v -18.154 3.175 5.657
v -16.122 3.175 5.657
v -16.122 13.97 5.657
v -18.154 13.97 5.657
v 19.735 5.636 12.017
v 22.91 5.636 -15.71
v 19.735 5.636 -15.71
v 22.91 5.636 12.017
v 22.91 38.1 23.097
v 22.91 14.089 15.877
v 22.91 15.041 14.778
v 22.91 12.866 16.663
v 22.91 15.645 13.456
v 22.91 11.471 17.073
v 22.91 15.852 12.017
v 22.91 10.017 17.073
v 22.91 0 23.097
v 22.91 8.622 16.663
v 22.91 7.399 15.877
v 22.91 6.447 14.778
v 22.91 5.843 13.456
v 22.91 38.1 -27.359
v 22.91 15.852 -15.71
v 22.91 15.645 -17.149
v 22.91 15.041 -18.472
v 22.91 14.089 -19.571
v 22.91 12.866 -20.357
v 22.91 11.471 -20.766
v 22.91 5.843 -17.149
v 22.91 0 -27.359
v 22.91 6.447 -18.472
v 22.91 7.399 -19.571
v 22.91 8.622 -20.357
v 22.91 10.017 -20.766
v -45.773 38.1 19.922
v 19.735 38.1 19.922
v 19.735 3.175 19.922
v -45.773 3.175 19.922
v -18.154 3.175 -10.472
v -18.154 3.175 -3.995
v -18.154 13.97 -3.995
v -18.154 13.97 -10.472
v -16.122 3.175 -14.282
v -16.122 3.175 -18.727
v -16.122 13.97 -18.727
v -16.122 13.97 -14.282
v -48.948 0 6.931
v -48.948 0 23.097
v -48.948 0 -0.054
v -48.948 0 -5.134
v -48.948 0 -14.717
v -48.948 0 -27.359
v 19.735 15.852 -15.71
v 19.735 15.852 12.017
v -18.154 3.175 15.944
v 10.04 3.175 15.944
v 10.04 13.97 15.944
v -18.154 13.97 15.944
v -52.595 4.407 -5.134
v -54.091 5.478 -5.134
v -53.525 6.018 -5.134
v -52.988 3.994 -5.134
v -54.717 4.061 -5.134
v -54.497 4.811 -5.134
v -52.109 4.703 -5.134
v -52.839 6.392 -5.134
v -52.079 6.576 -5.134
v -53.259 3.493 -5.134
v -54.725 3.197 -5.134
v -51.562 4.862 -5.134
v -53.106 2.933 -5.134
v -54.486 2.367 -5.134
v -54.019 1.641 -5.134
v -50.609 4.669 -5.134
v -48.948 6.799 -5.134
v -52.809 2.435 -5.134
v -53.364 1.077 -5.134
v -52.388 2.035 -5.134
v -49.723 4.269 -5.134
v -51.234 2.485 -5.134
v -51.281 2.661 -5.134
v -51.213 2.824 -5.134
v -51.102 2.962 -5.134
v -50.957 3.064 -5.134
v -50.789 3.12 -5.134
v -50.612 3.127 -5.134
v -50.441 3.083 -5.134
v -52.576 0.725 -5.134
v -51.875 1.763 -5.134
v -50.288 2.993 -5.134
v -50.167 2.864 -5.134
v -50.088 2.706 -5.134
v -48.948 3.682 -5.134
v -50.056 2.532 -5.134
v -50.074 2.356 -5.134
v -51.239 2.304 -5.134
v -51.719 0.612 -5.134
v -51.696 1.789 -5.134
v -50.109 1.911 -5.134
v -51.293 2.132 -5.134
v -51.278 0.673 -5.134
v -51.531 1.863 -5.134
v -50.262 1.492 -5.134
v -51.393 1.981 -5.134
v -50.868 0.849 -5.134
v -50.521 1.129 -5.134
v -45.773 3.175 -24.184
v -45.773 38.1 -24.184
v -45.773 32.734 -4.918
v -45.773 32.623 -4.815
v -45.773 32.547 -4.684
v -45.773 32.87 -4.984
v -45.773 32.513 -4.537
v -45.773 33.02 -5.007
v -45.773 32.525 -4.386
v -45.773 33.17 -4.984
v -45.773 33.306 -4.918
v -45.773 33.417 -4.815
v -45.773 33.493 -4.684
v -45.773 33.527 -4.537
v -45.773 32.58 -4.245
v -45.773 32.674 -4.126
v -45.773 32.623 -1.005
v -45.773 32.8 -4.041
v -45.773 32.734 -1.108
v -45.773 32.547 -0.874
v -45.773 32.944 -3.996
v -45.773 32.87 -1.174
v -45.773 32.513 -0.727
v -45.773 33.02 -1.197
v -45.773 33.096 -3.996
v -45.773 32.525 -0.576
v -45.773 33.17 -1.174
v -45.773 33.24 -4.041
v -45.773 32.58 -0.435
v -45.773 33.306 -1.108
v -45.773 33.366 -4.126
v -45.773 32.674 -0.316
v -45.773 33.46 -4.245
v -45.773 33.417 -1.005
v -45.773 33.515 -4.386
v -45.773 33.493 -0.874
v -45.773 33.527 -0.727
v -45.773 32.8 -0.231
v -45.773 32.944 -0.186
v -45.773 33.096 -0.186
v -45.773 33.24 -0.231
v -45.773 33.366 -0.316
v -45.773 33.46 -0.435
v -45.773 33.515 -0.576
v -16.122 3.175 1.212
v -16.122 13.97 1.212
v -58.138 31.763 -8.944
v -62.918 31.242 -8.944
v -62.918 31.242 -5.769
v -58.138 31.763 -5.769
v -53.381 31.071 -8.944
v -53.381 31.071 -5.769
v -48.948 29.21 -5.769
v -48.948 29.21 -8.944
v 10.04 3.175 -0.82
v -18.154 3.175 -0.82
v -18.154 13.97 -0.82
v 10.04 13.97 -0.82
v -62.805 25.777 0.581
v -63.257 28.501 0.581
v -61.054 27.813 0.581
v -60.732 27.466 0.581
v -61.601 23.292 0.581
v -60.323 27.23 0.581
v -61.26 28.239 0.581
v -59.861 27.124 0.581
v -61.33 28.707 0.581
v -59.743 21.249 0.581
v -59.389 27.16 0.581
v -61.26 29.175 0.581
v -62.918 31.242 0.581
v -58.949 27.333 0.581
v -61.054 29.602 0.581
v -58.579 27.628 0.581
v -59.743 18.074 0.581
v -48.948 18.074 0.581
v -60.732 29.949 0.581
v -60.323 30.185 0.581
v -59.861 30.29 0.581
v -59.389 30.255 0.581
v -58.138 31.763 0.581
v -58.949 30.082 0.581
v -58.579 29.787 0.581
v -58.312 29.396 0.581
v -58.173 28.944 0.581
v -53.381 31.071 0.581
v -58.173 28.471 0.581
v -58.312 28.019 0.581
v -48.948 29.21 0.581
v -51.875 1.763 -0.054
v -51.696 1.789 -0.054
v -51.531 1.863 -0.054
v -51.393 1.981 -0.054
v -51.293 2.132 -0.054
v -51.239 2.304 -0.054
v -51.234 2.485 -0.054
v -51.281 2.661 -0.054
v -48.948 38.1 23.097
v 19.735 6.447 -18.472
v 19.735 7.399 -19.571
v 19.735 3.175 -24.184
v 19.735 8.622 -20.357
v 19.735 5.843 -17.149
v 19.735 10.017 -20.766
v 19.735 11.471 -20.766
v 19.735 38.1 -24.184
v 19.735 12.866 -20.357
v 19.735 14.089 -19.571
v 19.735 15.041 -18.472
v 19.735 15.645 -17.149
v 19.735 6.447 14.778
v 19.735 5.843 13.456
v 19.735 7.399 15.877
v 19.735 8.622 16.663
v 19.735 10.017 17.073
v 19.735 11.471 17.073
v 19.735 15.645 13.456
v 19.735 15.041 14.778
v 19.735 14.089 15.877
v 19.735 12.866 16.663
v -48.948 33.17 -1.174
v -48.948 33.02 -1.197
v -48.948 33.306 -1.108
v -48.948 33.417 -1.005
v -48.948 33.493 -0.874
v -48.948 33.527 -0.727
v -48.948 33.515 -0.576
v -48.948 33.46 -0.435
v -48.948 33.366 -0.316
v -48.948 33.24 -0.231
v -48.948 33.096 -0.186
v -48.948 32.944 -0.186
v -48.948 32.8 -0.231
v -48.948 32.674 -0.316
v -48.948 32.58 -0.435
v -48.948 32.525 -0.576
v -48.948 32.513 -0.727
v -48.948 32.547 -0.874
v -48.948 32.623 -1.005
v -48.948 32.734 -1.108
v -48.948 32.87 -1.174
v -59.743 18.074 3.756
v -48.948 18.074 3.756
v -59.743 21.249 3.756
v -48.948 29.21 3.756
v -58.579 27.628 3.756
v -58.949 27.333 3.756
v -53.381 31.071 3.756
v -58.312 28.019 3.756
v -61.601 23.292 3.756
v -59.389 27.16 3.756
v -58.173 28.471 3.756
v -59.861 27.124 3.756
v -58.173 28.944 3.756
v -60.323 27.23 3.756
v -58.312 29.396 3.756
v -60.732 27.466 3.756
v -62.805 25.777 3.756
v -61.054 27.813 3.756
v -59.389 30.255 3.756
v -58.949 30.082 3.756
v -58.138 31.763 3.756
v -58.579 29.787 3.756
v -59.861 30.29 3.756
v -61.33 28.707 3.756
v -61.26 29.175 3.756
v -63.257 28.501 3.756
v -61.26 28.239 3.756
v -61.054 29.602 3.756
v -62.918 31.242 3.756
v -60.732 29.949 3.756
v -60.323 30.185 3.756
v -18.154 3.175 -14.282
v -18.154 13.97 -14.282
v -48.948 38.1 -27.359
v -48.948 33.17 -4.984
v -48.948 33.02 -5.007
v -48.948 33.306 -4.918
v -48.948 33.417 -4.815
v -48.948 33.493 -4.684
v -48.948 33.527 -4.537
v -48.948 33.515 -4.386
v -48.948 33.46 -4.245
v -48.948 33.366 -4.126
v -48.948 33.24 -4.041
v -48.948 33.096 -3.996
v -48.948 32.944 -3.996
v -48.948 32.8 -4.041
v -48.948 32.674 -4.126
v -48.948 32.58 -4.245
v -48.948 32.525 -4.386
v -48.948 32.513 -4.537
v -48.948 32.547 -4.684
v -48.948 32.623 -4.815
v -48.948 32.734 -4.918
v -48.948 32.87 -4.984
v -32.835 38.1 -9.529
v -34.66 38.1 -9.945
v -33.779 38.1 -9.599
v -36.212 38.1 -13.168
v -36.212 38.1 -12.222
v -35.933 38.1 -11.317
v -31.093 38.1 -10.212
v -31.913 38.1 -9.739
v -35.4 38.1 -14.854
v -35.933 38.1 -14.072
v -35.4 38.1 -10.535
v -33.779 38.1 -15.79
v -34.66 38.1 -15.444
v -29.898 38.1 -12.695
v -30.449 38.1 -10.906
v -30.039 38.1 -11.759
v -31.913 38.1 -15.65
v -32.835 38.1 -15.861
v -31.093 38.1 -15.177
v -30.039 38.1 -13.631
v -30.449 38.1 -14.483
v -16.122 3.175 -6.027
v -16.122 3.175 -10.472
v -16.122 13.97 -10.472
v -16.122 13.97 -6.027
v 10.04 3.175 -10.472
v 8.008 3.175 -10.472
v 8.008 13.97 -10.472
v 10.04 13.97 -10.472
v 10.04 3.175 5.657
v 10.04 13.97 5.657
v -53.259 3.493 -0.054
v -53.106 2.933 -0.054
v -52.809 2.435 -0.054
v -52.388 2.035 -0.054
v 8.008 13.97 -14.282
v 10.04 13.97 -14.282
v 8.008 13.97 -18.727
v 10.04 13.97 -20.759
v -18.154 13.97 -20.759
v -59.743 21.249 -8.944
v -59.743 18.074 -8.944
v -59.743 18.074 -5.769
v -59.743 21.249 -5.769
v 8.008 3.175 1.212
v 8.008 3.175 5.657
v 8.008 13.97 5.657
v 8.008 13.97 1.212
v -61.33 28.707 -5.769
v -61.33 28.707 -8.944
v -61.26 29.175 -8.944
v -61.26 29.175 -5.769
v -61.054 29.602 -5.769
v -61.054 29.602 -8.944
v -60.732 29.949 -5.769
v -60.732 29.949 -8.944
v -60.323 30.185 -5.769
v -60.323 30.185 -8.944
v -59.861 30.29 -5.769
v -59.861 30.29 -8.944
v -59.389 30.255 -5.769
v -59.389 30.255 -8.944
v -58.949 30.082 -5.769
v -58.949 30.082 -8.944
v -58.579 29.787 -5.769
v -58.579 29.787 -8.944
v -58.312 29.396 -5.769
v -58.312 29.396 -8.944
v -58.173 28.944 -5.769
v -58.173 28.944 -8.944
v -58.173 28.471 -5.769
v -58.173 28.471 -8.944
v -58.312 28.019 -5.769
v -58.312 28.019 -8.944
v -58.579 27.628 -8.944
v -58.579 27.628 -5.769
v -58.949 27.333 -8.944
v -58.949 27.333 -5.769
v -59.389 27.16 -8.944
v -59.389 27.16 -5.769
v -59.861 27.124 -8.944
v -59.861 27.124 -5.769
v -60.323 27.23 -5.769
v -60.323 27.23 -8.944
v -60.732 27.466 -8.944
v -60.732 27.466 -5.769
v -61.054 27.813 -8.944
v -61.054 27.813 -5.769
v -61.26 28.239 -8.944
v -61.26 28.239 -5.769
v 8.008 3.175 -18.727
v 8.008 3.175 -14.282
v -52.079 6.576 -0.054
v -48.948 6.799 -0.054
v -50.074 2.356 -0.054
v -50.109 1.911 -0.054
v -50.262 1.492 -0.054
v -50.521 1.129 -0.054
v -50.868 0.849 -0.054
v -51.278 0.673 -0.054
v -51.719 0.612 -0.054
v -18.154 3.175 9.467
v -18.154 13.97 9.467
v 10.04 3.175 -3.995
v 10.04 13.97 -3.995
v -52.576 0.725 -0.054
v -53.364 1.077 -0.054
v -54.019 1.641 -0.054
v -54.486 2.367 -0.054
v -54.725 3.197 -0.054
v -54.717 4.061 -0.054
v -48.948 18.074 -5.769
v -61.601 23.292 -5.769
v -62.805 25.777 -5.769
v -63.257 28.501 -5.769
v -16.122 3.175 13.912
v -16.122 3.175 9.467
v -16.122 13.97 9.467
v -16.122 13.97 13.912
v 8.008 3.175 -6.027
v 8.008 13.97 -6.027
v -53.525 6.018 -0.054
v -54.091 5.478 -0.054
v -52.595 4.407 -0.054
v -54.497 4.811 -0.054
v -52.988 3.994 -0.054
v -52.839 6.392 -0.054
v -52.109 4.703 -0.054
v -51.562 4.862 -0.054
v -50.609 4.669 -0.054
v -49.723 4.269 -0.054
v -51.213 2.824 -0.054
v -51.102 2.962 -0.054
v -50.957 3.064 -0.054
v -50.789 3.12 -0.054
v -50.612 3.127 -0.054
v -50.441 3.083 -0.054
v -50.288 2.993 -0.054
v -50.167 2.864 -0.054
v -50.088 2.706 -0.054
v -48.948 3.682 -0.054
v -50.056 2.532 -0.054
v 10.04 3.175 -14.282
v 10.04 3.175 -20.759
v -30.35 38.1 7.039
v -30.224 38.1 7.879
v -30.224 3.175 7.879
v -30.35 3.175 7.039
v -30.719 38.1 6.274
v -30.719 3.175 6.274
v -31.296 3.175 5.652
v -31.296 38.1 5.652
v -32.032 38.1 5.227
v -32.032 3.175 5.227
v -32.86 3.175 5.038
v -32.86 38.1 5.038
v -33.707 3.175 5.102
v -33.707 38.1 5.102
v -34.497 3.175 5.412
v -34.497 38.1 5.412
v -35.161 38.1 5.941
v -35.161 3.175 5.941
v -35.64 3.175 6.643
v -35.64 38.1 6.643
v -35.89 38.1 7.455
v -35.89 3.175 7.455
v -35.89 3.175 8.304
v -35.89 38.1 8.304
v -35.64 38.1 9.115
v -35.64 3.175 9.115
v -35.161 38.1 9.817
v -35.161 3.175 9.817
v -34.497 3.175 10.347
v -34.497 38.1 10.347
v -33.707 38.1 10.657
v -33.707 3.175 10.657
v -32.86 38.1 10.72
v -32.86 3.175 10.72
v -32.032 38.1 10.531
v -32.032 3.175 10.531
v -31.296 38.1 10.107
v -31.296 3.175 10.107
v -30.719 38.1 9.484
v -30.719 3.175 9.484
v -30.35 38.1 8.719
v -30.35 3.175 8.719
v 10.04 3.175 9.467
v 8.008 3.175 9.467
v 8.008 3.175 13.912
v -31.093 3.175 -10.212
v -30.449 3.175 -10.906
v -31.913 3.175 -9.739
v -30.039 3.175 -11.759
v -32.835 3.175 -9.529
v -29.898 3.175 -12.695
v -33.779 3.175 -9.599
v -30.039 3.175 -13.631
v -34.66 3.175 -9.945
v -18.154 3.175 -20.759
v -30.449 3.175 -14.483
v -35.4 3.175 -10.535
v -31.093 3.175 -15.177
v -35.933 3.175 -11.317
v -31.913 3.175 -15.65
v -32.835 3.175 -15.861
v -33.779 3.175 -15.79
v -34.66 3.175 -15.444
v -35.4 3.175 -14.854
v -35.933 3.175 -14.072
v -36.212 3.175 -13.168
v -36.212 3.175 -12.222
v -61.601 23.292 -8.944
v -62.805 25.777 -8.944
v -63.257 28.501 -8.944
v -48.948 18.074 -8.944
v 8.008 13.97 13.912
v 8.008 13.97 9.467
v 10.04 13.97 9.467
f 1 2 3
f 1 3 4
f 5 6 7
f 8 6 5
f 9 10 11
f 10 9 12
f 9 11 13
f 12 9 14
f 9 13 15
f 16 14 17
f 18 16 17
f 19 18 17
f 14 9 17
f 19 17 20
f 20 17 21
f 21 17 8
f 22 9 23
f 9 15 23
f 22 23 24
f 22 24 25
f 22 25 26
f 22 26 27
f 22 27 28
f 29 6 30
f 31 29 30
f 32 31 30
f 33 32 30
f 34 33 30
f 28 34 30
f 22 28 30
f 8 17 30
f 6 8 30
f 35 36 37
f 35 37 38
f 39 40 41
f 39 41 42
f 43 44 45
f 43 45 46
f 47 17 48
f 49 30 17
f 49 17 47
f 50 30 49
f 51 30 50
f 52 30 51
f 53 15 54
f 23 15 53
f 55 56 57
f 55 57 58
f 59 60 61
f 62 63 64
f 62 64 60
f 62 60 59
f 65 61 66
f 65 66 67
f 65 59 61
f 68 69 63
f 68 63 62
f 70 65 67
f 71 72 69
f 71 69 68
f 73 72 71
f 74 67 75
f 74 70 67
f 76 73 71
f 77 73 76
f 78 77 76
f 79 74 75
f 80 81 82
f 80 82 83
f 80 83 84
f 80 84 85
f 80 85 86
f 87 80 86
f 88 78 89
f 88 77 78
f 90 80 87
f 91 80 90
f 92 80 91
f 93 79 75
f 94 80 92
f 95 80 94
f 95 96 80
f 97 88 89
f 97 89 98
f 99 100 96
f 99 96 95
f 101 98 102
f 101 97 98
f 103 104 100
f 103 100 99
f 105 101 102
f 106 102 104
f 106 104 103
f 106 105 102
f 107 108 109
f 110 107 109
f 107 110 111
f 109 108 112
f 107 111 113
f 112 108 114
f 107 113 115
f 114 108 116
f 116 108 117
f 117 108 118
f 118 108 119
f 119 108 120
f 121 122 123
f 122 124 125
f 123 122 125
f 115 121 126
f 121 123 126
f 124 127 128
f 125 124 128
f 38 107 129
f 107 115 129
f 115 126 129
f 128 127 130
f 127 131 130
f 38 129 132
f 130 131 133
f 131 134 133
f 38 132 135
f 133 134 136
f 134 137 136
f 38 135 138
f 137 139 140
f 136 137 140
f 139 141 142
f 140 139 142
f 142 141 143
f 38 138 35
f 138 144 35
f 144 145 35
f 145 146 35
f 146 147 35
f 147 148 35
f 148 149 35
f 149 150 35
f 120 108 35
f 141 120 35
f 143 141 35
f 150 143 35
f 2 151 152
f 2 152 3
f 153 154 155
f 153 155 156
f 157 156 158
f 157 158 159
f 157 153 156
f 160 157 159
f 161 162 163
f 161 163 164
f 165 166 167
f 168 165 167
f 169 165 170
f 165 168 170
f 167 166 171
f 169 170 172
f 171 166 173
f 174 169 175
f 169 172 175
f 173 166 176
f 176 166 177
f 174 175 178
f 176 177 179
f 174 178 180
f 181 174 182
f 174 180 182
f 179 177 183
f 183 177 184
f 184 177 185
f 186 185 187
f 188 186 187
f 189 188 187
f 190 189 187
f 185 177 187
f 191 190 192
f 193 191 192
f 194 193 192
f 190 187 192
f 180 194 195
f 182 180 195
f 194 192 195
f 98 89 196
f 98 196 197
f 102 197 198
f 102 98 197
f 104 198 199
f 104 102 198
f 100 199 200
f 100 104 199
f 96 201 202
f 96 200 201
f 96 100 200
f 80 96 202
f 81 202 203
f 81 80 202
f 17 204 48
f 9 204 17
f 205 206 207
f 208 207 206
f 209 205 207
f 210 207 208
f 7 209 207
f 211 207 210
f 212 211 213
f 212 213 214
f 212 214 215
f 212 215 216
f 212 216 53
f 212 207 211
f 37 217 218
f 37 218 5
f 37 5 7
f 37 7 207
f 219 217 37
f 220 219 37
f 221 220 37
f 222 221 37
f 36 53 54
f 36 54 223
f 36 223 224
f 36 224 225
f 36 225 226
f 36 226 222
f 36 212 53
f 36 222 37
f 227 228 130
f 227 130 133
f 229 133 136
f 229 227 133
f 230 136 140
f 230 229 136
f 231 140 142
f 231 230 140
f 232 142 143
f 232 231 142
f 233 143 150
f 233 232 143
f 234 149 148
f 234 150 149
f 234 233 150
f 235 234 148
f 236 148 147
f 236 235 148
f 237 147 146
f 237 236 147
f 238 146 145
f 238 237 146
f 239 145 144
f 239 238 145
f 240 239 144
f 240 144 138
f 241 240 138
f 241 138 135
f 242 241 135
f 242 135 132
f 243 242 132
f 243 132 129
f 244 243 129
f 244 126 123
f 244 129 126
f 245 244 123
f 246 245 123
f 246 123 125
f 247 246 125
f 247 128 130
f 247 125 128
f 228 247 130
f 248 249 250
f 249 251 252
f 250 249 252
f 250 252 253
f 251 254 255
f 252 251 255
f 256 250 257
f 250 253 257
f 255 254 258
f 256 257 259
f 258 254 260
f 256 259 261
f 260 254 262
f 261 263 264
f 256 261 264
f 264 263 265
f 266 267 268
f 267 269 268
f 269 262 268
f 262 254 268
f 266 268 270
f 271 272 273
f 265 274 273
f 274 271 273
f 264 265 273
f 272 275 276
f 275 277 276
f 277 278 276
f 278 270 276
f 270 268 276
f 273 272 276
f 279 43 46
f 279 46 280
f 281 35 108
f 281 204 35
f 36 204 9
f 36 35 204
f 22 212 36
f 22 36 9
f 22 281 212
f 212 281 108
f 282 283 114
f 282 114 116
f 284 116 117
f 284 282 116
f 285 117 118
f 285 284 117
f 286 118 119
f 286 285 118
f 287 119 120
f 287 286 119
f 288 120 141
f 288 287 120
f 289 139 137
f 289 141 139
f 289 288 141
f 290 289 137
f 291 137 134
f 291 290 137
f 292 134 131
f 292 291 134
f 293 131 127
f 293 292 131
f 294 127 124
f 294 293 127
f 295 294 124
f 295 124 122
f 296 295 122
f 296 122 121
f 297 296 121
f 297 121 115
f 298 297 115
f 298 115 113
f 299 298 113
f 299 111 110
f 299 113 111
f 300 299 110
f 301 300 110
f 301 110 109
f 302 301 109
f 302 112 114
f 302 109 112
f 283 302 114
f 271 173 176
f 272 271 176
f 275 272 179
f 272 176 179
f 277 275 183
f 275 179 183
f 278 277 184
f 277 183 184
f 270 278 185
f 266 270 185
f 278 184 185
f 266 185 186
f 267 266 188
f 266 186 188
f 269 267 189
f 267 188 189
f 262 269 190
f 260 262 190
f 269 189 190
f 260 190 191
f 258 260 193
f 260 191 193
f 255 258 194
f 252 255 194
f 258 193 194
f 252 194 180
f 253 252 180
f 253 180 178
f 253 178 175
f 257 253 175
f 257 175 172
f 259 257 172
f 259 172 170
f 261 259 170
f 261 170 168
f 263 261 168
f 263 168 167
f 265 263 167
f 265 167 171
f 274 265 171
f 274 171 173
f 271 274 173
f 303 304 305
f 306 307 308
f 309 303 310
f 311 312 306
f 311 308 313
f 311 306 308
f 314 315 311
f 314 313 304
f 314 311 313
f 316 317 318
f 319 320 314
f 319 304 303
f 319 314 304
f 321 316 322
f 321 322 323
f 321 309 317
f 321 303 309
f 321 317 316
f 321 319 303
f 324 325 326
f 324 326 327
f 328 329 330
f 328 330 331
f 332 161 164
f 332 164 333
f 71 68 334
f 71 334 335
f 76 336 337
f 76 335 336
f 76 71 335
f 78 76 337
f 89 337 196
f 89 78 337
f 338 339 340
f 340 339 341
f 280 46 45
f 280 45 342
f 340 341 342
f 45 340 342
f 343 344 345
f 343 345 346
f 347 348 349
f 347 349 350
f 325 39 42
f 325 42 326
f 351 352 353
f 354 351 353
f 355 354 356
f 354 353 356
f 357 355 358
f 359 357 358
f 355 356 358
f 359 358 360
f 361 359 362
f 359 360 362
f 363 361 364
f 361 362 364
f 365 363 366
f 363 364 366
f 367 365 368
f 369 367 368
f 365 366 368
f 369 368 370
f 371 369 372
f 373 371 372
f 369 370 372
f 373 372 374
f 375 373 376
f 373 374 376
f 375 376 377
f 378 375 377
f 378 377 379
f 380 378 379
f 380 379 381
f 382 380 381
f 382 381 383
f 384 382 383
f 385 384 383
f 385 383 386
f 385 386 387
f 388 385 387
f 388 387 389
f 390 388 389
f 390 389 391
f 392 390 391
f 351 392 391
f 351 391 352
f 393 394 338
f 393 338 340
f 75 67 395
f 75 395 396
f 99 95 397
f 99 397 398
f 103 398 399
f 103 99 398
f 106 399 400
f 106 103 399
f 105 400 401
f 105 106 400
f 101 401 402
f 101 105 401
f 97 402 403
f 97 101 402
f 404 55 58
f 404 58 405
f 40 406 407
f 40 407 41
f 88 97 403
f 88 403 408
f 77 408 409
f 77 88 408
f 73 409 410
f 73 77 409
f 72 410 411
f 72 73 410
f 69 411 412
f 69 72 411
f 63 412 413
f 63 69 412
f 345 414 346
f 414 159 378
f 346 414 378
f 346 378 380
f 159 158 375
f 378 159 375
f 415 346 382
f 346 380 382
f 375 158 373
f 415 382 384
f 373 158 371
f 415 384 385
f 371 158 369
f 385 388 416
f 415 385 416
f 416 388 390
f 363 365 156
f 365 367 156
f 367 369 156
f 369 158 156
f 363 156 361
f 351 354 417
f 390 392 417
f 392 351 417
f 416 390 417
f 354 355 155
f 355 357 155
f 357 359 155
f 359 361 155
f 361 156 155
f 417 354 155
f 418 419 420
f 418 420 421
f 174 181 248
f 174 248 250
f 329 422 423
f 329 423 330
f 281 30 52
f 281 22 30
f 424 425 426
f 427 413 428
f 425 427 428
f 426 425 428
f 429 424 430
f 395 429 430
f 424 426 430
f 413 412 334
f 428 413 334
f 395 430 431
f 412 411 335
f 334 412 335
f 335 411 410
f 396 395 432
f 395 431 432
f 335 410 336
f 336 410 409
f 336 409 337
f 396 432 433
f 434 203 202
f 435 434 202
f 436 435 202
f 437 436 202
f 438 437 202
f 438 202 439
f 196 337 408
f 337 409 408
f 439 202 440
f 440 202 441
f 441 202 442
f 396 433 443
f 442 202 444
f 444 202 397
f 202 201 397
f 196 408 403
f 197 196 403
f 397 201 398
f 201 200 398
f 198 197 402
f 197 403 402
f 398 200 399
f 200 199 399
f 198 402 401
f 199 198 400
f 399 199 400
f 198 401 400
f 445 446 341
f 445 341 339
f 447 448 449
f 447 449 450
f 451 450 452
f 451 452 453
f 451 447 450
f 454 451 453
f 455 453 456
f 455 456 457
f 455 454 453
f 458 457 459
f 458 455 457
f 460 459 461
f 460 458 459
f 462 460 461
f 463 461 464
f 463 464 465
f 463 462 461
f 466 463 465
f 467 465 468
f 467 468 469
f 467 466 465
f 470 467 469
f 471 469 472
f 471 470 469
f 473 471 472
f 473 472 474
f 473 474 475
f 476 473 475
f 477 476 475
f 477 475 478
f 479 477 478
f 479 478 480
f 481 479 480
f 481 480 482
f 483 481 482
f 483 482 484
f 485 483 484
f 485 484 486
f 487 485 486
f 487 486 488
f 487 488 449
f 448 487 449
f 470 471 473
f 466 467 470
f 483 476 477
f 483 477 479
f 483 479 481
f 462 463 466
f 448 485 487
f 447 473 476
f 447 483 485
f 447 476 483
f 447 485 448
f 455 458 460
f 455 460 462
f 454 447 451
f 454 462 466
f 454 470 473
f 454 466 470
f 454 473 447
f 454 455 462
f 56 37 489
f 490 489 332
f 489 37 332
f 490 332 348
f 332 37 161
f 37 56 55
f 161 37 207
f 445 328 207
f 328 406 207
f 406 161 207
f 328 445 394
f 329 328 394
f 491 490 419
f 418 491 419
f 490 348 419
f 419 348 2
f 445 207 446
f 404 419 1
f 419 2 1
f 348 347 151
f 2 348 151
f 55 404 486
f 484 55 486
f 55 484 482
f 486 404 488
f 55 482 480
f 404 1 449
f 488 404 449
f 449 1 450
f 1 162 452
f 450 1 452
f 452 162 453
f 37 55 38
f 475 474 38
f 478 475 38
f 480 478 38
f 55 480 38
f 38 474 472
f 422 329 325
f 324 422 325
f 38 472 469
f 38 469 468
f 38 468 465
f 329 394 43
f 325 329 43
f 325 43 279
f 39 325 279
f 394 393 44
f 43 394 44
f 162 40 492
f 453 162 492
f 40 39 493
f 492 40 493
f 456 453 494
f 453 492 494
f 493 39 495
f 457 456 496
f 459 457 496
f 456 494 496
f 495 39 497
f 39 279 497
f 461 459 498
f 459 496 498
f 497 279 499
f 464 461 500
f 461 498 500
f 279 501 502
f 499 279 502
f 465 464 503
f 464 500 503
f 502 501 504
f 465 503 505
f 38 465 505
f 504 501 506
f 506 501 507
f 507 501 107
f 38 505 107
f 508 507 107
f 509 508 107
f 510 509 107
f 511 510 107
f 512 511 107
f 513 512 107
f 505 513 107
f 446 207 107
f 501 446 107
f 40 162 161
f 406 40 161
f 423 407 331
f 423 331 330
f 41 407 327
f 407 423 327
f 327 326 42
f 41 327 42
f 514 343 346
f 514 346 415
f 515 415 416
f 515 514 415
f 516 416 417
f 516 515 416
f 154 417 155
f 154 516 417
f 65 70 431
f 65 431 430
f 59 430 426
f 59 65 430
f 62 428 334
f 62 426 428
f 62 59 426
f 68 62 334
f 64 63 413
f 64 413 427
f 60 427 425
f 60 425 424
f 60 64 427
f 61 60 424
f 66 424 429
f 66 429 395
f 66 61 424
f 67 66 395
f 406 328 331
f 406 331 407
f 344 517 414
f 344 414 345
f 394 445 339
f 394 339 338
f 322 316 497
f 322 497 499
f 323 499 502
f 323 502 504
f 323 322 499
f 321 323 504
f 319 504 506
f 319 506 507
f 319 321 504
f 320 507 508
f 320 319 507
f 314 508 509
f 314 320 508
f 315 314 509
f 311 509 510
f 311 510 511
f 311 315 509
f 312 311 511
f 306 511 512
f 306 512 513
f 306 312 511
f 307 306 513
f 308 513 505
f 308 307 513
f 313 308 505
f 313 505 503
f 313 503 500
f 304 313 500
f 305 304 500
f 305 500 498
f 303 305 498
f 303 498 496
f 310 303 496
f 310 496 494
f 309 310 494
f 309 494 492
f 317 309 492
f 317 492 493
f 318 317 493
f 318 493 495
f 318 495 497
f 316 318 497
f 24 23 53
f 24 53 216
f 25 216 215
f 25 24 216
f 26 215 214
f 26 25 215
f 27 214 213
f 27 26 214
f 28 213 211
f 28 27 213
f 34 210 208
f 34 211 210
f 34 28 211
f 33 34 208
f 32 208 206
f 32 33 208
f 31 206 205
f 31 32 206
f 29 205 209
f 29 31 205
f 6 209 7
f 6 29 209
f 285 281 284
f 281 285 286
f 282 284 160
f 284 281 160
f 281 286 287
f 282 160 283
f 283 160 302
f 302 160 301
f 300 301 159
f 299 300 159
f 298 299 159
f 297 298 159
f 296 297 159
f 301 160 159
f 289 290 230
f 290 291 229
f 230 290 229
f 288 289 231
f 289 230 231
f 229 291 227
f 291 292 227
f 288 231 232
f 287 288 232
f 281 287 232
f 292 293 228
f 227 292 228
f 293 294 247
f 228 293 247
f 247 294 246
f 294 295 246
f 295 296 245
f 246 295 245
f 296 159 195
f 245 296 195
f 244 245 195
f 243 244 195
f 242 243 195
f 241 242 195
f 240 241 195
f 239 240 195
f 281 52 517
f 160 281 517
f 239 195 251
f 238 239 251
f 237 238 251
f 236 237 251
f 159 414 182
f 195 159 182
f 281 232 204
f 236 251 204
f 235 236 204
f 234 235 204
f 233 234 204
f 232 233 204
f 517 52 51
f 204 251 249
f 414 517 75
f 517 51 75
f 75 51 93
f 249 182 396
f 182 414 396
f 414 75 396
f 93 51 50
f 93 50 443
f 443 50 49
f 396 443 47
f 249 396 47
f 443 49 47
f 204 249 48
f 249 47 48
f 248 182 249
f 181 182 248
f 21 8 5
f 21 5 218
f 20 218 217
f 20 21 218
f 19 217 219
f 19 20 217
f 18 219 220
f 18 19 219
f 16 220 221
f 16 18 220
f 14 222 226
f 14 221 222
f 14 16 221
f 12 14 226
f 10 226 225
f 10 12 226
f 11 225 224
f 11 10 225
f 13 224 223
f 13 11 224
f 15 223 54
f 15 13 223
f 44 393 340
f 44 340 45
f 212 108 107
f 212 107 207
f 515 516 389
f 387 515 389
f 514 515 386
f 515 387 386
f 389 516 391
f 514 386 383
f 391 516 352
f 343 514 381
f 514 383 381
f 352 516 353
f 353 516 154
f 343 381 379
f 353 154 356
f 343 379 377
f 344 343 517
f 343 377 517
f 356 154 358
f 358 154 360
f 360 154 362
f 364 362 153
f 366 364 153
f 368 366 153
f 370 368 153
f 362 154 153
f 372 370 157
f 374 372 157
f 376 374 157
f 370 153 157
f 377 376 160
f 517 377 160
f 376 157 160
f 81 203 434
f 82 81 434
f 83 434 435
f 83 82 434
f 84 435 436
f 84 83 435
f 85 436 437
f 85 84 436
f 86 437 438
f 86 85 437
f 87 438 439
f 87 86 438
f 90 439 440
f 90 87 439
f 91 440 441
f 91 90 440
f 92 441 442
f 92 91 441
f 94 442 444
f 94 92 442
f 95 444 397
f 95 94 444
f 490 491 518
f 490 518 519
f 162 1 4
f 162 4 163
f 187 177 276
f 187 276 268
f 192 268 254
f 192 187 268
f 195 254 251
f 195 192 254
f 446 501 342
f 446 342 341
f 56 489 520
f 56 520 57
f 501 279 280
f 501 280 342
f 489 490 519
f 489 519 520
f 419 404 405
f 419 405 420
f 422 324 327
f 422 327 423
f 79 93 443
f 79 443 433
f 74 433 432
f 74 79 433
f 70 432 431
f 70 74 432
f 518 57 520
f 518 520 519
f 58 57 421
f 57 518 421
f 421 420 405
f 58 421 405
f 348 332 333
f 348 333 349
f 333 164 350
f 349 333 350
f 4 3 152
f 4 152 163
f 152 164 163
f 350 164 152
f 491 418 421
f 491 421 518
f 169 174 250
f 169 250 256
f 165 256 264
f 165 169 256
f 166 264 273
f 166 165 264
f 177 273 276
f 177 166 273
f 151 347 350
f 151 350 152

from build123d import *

# Parameters (mm, degrees)
BOSS_EXTRUDE1_DEPTH     = 38.1
CUT_EXTRUDE1_DEPTH      = 34.925
SERVO_BOX_1_DEPTH       = 13.97
SERVO_BOX_2_DEPTH       = 13.97
SKETCH36_R              = 1.5875
RING_ATTACHMENT_DEPTH   = 19.05
ATTACHMENT_TRIM_DEPTH   = 25.4
SKETCH33_R              = 0.508
RING_FINGER_HOLES_DEPTH = 31.75
CORD_HOLE_DEPTH         = 44.45
RING_HOOK_DEPTH         = 19.05
MIDDLE_HOOK_DEPTH       = 19.05
MIDDLE_HOOK_2_DEPTH     = 19.05
SKETCH57_W              = 6.44385504
SKETCH57_H              = 7.30367128
MIDDLE_HOOK_CUT_1_DEPTH = 19.05
SKETCH65_W              = 5.804806401
SKETCH65_H              = 9.582838289
SKETCH65_H_2            = 6.985
SKETCH65_W_2            = 10.36865681
SKETCH65_H_3            = 26.914043033
CUT_EXTRUDE9_DEPTH      = 15.24
CUT_EXTRUDE10_DEPTH     = 50.8
SKETCH67_R              = 2.848989685
SKETCH67_R_2            = 3.175
BOSS_EXTRUDE2_DEPTH     = 38.1


with BuildPart() as part:
    # Sketch2 → Boss-Extrude1 (new body)
    with BuildSketch(Plane(origin=(0, 0, 0), x_dir=(1, 0, 0), z_dir=(0, 1, 0))):
        with BuildLine():
            Line((-20.778406205, 52.758673202), (-36.188953289, 52.758673202))
            Line((-36.188953289, 52.758673202), (-36.188953289, 33.708673202))
            Line((-36.188953289, 33.708673202), (-38.864171838, 27.358673202))
            Line((-38.864171838, 27.358673202), (-48.947687906, 27.358673202))
            Line((-48.947687906, 27.358673202), (-48.947687906, 8.308673202))
            Line((-48.947687906, 8.308673202), (-48.947687906, -42.491326798))
            Line((-48.947687906, -42.491326798), (-42.959403849, -42.491326798))
            ThreePointArc((-42.959403849, -42.491326798), (-29.448791922, -45.239401215), (-16.422067996, -49.755263412))
            ThreePointArc((-16.422067996, -49.755263412), (-10.441569813, -54.6928899), (-3.738179712, -58.593027718))
            Line((-3.738179712, -58.593027718), (-3.738179712, -63.210333869))
            Line((-3.738179712, -63.210333869), (15.311820288, -63.210333869))
            ThreePointArc((15.311820288, -63.210333869), (19.123708761, -63.010602415), (22.909801598, -62.524919994))
            Line((22.909801598, -62.524919994), (22.909801598, 48.896004027))
            ThreePointArc((22.909801598, 48.896004027), (1.17082788, 52.016399628), (-20.778406205, 52.758673202))
        make_face()
    extrude(amount=BOSS_EXTRUDE1_DEPTH)

    # Sketch3 → Cut-Extrude1 (cut)
    with BuildSketch(Plane(origin=(0, 38.1, 0), x_dir=(1, 0, 0), z_dir=(0, 1, 0))):
        Polygon((-45.772687906, 24.183673202), (19.734801598, 24.183673202), (19.734801598, -19.921590233), (-45.772687906, -19.921590233), (-45.772687906, 7.713042295), align=None)
        with BuildLine():
            Line((-38.864171838, 27.358673202), (22.909801598, 27.358673202))
            ThreePointArc((22.909801598, 27.358673202), (-7.97718512, 133.680362497), (-38.864171838, 27.358673202))
        make_face()
        with BuildLine():
            Line((-48.947687906, -23.096590233), (22.909801598, -23.096590233))
            ThreePointArc((22.909801598, -23.096590233), (35.616611998, -147.942668358), (-48.947687906, -55.22327753))
            Line((-48.947687906, -55.22327753), (-48.947687906, -23.096590233))
        make_face()
    extrude(amount=-CUT_EXTRUDE1_DEPTH, mode=Mode.SUBTRACT)

    # Sketch6 → Servo Box 1 (add)
    with BuildSketch(Plane(origin=(0, 0, 0), x_dir=(1, 0, 0), z_dir=(0, 1, 0))):
        Polygon((-18.154039747, -9.466732857), (-16.122039747, -9.466732857), (-16.122039747, -13.911732857), (8.007960253, -13.911732857), (8.007960253, -9.466732857), (10.039960253, -9.466732857), (10.039960253, -15.943732857), (-18.154039747, -15.943732857), align=None)
        Polygon((8.007960253, -1.211732857), (-16.122039747, -1.211732857), (-16.122039747, -5.656732857), (-18.154039747, -5.656732857), (-18.154039747, 0.820267143), (10.039960253, 0.820267143), (10.039960253, -5.656732857), (8.007960253, -5.656732857), align=None)
    extrude(amount=SERVO_BOX_1_DEPTH)

    # Sketch7 → Servo Box 2 (add)
    with BuildSketch(Plane(origin=(0, 0, 0), x_dir=(1, 0, 0), z_dir=(0, 1, 0))):
        Polygon((-18.154039747, 10.472267143), (-16.122039747, 10.472267143), (-16.122039747, 6.027267143), (8.007960253, 6.027267143), (8.007960253, 10.472267143), (10.039960253, 10.472267143), (10.039960253, 3.995267143), (-18.154039747, 3.995267143), align=None)
        Polygon((8.007960253, 18.727267143), (-16.122039747, 18.727267143), (-16.122039747, 14.282267143), (-18.154039747, 14.282267143), (-18.154039747, 20.759267143), (10.039960253, 20.759267143), (10.039960253, 14.282267143), (8.007960253, 14.282267143), align=None)
    extrude(amount=SERVO_BOX_2_DEPTH)

    # Sketch36 → Ring Attachment (add)
    with BuildSketch(Plane(origin=(0, 0, -12.118673202), x_dir=(-1, 0, 0), z_dir=(0, 0, -1))):
        with BuildLine():
            Line((48.947687906, 29.21), (48.947687906, 18.074207691))
            Line((48.947687906, 18.074207691), (53.392687906, 18.074207691))
            Line((53.392687906, 18.074207691), (59.742687906, 18.074207691))
            Line((59.742687906, 18.074207691), (59.742687906, 21.249207691))
            ThreePointArc((59.742687906, 21.249207691), (62.80538306, 25.776891551), (62.917687906, 31.242))
            ThreePointArc((62.917687906, 31.242), (55.737515168, 31.567812574), (48.947687906, 29.21))
        make_face()
        with Locations((59.742687906, 28.707395517)):
            Circle(SKETCH36_R, mode=Mode.SUBTRACT)
    extrude(amount=-RING_ATTACHMENT_DEPTH)

    # Sketch40 → Attachment Trim (cut)
    with BuildSketch(Plane(origin=(0, 38.1, 0), x_dir=(1, 0, 0), z_dir=(0, 1, 0))):
        with BuildLine():
            Line((-48.947687906, -6.931326798), (-48.947687906, -3.756326798))
            Line((-48.947687906, -3.756326798), (-65.361733155, -3.756326798))
            Line((-65.361733155, -3.756326798), (-65.361733155, -0.581326798))
            Line((-65.361733155, -0.581326798), (-48.947687906, -0.581326798))
            Line((-48.947687906, -0.581326798), (-48.947687906, 5.768673202))
            Line((-48.947687906, 5.768673202), (-65.776264763, 5.768673202))
            Line((-65.776264763, 5.768673202), (-65.776264763, 8.943673202))
            Line((-65.776264763, 8.943673202), (-48.947687906, 8.943673202))
            Line((-48.947687906, 8.943673202), (-48.947687906, 12.118673202))
            ThreePointArc((-48.947687906, 12.118673202), (-80.34840255, 2.593673202), (-48.947687906, -6.931326798))
        make_face()
    extrude(amount=-ATTACHMENT_TRIM_DEPTH, mode=Mode.SUBTRACT)

    # Sketch33 → Ring Finger Holes (cut)
    with BuildSketch(Plane(origin=(-69.85, 0, 0), x_dir=(0, 0, -1), z_dir=(1, 0, 0))):
        with Locations((0.688673202, 33.02)):
            Circle(SKETCH33_R)
        with Locations((4.498673202, 33.02)):
            Circle(SKETCH33_R)
    extrude(amount=RING_FINGER_HOLES_DEPTH, mode=Mode.SUBTRACT)

    # Sketch41 → Cord Hole (cut)
    with BuildSketch(Plane(origin=(62.913848002, 0, 0), x_dir=(0, 0, -1), z_dir=(1, 0, 0))):
        with BuildLine():
            Line((-12.016652412, 15.851932983), (15.710210154, 15.851932983))
            ThreePointArc((15.710210154, 15.851932983), (20.818250673, 10.743892464), (15.710210154, 5.635851946))
            Line((15.710210154, 5.635851946), (-12.016652412, 5.635851946))
            ThreePointArc((-12.016652412, 5.635851946), (-17.12469293, 10.743892464), (-12.016652412, 15.851932983))
        make_face()
    extrude(amount=-CORD_HOLE_DEPTH, mode=Mode.SUBTRACT)

    # Sketch52 → Ring Hook (add)
    with BuildSketch(Plane(origin=(0, 0, -12.118673202), x_dir=(-1, 0, 0), z_dir=(0, 0, -1))):
        with BuildLine():
            Line((52.079417812, 6.575838366), (48.947687906, 6.798773562))
            Line((48.947687906, 6.798773562), (48.947687906, 3.681759929))
            ThreePointArc((48.947687906, 3.681759929), (50.154592803, 4.494095024), (51.56202319, 4.862398487))
            ThreePointArc((51.56202319, 4.862398487), (52.595162873, 4.406515303), (53.259394348, 3.493277311))
            ThreePointArc((53.259394348, 3.493277311), (52.80871858, 2.435311228), (51.875495098, 1.763377592))
            ThreePointArc((51.875495098, 1.763377592), (51.337693114, 2.052625855), (51.280629769, 2.660605548))
            ThreePointArc((51.280629769, 2.660605548), (50.525041175, 3.111212192), (50.07443453, 2.355623598))
            ThreePointArc((50.07443453, 2.355623598), (50.521061084, 1.129253272), (51.719490009, 0.612312688))
            ThreePointArc((51.719490009, 0.612312688), (54.01907529, 1.640613281), (54.717115143, 4.060992371))
            ThreePointArc((54.717115143, 4.060992371), (53.825637568, 5.766663725), (52.079417812, 6.575838366))
        make_face()
    extrude(amount=-RING_HOOK_DEPTH)


with BuildPart() as body_2:
    # Sketch56 → Middle Hook (new body)
    with BuildSketch(Plane(origin=(0, 0, 13.281326798), x_dir=(-1, 0, 0), z_dir=(0, 0, -1))):
        with BuildLine():
            Line((59.307557511, 8.89), (56.767557511, 8.89))
            Line((56.767557511, 8.89), (56.767557511, 12.007013633))
            ThreePointArc((56.767557511, 12.007013633), (57.832492224, 10.713868099), (59.307557511, 9.919831756))
            ThreePointArc((59.307557511, 9.919831756), (60.589681431, 10.520271405), (61.228710278, 11.783604952))
            ThreePointArc((61.228710278, 11.783604952), (60.623886944, 13.07409489), (59.342790307, 13.69856823))
            ThreePointArc((59.342790307, 13.69856823), (58.957508965, 13.481176717), (58.80220943, 13.066951131))
            ThreePointArc((58.80220943, 13.066951131), (58.461789356, 12.706641867), (58.101480093, 13.047061941))
            ThreePointArc((58.101480093, 13.047061941), (58.440138088, 13.935120258), (59.307557511, 14.323604952))
            ThreePointArc((59.307557511, 14.323604952), (61.228626965, 13.52787193), (62.024359987, 11.606802476))
            ThreePointArc((62.024359987, 11.606802476), (61.228626965, 9.685733022), (59.307557511, 8.89))
        make_face()
    extrude(amount=-MIDDLE_HOOK_DEPTH)

    # Sketch57 → Middle Hook Cut 1 (cut)
    with BuildSketch(Plane(origin=(0, 0, 13.281326798), x_dir=(-1, 0, 0), z_dir=(0, 0, -1))):
        with Locations((59.989485031, 11.404925675)):
            Rectangle(SKETCH57_W, SKETCH57_H)
    extrude(amount=-MIDDLE_HOOK_CUT_1_DEPTH, mode=Mode.SUBTRACT)


with BuildPart() as body_3:
    # Sketch56 → Middle Hook 2 (new body)
    with BuildSketch(Plane(origin=(0, 0, 13.281326798), x_dir=(-1, 0, 0), z_dir=(0, 0, -1))):
        with BuildLine():
            Line((59.307557511, 6.798773562), (56.767557511, 6.798773562))
            Line((56.767557511, 6.798773562), (56.767557511, 3.681759929))
            ThreePointArc((56.767557511, 3.681759929), (57.832492224, 4.974905464), (59.307557511, 5.768941806))
            ThreePointArc((59.307557511, 5.768941806), (60.589681431, 5.168502157), (61.228710278, 3.905168611))
            ThreePointArc((61.228710278, 3.905168611), (60.623886944, 2.614678673), (59.342790307, 1.990205333))
            ThreePointArc((59.342790307, 1.990205333), (58.957508965, 2.207596845), (58.80220943, 2.621822432))
            ThreePointArc((58.80220943, 2.621822432), (58.461789356, 2.982131695), (58.101480093, 2.641711621))
            ThreePointArc((58.101480093, 2.641711621), (58.440138088, 1.753653304), (59.307557511, 1.365168611))
            ThreePointArc((59.307557511, 1.365168611), (61.228626965, 2.160901633), (62.024359987, 4.081971086))
            ThreePointArc((62.024359987, 4.081971086), (61.228626965, 6.00304054), (59.307557511, 6.798773562))
        make_face()
    extrude(amount=-MIDDLE_HOOK_2_DEPTH)


with BuildPart() as cut_extrude9_tool:
    # Sketch65 → Cut-Extrude9 (new body)
    with BuildSketch(Plane(origin=(0, 0, 0), x_dir=(1, 0, 0), z_dir=(0, 1, 0))):
        with Locations((-51.850091107, 9.925092347)):
            Rectangle(SKETCH65_W, SKETCH65_H)
        with Locations((-51.850091107, -3.438826798)):
            Rectangle(SKETCH65_W, SKETCH65_H_2)
        with Locations((-59.388818787, -23.035181565)):
            Rectangle(SKETCH65_W_2, SKETCH65_H_3)
    extrude(amount=CUT_EXTRUDE9_DEPTH)


with BuildPart() as part_1:
    add(part.part)

    # Cut-Extrude9: cut by cut_extrude9_tool
    add(cut_extrude9_tool.part, mode=Mode.SUBTRACT)

    # Sketch66 → Cut-Extrude10 (cut)
    with BuildSketch(Plane(origin=(0, 38.1, 0), x_dir=(1, 0, 0), z_dir=(0, 1, 0))):
        with BuildLine():
            Line((-48.947687906, -23.096590233), (22.909801598, -23.096590233))
            ThreePointArc((22.909801598, -23.096590233), (-13.018943154, -212.453183119), (-48.947687906, -23.096590233))
        make_face()
        with BuildLine():
            Line((22.909801598, 27.358673202), (-48.947687906, 27.358673202))
            ThreePointArc((-48.947687906, 27.358673202), (-13.018943154, 126.14838829), (22.909801598, 27.358673202))
        make_face()
    extrude(amount=-CUT_EXTRUDE10_DEPTH, mode=Mode.SUBTRACT)

    # Sketch67 → Boss-Extrude2 (add)
    with BuildSketch(Plane(origin=(0, 38.1, 0), x_dir=(1, 0, 0), z_dir=(0, 1, 0))):
        with Locations((-33.072687906, -7.879232857)):
            Circle(SKETCH67_R)
        with Locations((-33.072687906, 12.694767143)):
            Circle(SKETCH67_R_2)
    extrude(amount=-BOSS_EXTRUDE2_DEPTH)


with BuildPart() as body_3_1:
    add(body_3.part)

    # Cut-Extrude9: cut by cut_extrude9_tool
    add(cut_extrude9_tool.part, mode=Mode.SUBTRACT)


solid = part_1.part
